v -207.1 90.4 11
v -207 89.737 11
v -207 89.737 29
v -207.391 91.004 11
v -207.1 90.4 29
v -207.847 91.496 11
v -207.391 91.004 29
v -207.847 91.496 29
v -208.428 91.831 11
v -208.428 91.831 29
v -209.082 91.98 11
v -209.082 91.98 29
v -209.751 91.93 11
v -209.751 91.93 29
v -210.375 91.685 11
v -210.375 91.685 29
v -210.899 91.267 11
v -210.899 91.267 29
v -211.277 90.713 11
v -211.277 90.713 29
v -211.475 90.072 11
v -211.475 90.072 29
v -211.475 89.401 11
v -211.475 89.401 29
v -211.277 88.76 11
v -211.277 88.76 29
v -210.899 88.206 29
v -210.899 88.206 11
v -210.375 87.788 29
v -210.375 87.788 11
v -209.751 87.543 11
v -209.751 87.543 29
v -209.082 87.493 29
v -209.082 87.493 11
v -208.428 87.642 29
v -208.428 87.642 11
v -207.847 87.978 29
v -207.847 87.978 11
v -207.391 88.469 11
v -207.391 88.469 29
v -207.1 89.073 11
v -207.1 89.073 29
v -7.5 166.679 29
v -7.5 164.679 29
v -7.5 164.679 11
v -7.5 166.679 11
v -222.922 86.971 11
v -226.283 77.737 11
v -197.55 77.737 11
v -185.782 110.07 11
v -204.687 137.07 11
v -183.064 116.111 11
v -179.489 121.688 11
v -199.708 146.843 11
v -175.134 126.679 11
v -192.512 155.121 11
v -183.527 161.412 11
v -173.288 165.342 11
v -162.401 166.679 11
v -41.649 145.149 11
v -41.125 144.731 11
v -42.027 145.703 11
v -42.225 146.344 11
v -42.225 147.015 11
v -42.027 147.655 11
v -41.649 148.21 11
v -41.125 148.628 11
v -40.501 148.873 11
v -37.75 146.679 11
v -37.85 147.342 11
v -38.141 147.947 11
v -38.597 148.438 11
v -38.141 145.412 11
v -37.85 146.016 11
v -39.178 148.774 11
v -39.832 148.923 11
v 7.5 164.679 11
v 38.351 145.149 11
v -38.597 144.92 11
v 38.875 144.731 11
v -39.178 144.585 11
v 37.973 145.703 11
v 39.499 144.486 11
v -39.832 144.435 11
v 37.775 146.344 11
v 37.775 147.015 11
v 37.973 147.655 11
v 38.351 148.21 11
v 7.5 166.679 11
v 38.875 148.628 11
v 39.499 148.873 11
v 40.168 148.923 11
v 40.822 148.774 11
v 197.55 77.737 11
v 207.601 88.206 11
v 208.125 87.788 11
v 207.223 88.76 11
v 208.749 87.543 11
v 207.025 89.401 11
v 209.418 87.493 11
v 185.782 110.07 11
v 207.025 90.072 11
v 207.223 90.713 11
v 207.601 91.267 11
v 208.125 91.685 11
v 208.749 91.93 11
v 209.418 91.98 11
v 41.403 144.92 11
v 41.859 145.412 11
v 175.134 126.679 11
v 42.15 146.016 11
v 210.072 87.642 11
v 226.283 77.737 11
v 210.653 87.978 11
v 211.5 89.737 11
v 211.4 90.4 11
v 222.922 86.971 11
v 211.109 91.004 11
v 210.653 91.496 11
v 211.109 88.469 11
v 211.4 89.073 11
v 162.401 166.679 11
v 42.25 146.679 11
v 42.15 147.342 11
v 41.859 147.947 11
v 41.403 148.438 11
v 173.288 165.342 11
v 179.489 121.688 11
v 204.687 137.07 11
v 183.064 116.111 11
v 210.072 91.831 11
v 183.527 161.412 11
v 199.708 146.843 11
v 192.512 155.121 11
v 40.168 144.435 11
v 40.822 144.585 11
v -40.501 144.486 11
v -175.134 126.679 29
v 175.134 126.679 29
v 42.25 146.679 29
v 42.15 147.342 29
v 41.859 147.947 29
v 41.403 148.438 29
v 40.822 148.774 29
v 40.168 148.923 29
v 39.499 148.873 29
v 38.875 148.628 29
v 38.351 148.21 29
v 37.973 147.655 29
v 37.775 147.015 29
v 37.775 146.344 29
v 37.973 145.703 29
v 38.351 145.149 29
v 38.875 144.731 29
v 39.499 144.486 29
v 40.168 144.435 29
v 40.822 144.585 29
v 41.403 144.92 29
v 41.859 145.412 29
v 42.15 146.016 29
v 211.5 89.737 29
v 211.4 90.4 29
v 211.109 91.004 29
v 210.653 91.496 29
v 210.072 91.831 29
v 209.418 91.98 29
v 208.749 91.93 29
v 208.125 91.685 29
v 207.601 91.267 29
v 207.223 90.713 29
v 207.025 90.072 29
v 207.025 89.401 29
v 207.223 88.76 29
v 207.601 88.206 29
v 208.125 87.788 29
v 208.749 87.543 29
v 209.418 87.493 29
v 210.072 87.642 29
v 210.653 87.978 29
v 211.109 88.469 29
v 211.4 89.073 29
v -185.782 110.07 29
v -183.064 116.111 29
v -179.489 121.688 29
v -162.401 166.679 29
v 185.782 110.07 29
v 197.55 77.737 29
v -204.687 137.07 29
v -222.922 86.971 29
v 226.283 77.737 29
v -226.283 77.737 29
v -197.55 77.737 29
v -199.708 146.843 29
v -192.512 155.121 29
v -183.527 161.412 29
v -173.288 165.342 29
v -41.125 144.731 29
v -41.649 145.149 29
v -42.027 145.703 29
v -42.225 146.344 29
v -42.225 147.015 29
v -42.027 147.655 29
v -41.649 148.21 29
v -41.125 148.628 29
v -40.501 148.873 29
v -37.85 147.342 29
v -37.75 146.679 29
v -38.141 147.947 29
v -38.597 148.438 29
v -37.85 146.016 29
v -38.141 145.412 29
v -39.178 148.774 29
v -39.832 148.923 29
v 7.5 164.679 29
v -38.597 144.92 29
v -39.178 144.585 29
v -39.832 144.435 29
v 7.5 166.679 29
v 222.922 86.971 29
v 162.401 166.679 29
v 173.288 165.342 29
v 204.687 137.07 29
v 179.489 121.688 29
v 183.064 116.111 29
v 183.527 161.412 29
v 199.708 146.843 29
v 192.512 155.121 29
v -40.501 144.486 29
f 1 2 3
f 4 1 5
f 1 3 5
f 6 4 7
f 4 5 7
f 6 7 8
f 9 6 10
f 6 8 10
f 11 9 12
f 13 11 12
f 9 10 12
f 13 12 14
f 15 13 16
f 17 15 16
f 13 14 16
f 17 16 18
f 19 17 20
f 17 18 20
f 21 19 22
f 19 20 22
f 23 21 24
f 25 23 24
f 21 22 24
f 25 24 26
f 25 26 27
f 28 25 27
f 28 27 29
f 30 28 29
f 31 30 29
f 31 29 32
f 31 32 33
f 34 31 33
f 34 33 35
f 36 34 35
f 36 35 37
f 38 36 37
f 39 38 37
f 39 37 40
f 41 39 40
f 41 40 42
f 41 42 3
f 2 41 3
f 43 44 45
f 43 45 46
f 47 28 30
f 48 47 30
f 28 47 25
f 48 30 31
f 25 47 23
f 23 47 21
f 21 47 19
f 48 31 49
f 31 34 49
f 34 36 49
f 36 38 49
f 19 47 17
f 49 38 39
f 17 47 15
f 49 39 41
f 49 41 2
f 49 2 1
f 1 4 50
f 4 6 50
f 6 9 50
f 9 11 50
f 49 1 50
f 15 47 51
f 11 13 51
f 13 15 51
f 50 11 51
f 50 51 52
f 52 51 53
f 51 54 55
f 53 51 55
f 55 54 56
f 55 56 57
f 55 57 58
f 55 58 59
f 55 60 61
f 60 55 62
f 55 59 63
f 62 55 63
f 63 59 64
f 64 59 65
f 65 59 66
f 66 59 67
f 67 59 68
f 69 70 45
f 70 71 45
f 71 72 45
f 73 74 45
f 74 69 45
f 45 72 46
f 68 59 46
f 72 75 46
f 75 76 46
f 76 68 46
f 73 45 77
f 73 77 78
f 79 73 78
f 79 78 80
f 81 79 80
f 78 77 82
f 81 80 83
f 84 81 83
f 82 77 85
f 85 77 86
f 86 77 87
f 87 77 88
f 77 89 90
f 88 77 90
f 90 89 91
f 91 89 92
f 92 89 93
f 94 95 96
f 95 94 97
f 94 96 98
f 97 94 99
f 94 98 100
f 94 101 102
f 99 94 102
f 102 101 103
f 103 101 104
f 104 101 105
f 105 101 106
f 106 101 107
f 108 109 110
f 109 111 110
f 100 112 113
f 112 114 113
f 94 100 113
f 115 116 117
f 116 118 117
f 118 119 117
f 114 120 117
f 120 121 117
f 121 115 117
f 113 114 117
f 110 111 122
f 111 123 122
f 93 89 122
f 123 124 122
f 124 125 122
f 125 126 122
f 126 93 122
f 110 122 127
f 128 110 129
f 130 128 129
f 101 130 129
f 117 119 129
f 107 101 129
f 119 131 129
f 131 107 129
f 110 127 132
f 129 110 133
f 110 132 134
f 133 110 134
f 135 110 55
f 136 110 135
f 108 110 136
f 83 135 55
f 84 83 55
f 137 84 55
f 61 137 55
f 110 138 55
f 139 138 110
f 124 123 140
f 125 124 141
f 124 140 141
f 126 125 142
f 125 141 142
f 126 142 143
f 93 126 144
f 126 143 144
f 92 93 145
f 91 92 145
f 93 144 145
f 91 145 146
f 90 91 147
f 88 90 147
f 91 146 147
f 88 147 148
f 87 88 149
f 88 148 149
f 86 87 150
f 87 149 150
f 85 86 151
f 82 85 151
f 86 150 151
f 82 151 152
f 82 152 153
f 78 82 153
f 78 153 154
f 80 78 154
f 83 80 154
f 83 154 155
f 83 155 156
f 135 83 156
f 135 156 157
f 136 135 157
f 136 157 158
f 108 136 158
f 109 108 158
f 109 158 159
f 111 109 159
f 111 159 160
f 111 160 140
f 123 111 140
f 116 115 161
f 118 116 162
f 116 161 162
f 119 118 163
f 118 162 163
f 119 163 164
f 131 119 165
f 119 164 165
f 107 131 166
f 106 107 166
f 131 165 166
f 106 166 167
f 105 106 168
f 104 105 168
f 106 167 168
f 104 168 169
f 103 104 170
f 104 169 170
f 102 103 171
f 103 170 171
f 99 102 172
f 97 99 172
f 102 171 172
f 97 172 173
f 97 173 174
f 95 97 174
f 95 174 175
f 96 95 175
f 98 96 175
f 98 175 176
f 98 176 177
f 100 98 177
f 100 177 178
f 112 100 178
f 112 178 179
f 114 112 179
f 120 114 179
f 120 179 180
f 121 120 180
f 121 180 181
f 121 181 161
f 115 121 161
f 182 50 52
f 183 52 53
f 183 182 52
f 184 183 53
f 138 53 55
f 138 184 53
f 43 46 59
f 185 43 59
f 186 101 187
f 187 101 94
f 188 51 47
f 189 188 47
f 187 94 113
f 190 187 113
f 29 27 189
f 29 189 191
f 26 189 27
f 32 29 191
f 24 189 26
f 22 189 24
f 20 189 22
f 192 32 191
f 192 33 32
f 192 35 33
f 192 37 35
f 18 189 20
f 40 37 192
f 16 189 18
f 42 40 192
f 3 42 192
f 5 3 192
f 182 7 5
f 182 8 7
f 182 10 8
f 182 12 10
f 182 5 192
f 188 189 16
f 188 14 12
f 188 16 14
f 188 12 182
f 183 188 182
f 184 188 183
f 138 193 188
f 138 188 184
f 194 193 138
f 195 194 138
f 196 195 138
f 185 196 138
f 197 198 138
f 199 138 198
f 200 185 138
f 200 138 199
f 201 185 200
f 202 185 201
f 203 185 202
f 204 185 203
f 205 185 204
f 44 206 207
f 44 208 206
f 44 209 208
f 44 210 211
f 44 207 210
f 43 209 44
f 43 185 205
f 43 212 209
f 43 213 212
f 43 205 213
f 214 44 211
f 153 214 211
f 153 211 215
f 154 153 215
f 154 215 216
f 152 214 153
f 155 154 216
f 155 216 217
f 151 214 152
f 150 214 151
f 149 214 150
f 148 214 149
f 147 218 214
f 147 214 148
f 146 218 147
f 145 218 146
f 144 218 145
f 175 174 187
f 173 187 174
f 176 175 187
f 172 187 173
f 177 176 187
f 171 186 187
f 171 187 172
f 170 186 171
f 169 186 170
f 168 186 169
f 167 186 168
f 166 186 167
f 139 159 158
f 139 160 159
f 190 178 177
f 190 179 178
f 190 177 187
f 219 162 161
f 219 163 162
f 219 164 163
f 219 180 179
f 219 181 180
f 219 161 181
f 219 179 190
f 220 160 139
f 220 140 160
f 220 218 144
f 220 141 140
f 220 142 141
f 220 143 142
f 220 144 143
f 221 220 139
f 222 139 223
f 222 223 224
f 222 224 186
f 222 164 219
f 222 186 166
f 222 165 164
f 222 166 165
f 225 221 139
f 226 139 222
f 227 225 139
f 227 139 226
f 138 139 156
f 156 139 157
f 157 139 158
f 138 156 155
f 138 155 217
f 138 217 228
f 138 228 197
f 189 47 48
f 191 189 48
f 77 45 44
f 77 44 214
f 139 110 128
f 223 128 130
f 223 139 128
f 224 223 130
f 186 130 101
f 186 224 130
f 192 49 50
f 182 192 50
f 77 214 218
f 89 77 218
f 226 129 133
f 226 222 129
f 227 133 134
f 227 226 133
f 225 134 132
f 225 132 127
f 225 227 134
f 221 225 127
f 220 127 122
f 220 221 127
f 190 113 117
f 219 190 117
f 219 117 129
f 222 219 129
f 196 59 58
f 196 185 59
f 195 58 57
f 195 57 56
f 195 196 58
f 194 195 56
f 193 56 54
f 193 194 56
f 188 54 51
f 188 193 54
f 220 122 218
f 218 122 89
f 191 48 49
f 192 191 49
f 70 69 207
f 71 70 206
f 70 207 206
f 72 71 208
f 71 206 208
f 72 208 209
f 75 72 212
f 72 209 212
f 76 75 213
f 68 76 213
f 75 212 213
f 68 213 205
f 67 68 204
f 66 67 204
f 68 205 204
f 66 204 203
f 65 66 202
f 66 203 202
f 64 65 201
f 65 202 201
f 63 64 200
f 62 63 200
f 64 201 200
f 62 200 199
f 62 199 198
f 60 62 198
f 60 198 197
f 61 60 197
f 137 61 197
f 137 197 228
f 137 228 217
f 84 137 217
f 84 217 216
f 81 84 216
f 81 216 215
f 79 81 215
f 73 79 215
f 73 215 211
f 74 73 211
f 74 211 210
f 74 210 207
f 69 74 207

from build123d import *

# Parameters (mm, degrees)
SALIENTE_EXTRUIR1_DEPTH = 40
REDONDEO1_R             = 100
ESCALA1_SCALE           = 0.6
ESCALA2_SCALE           = 0.75
SALIENTE_EXTRUIR2_DEPTH = 18
CROQUIS3_W              = 15
CROQUIS3_H              = 2
CORTAR_EXTRUIR1_DEPTH   = 19
CROQUIS4_R              = 2.25
CORTAR_EXTRUIR3_DEPTH   = 19
CROQUIS5_R              = 2.25
CORTAR_EXTRUIR4_DEPTH   = 19


with BuildPart() as part:
    # Croquis1 → Saliente-Extruir1 (new body)
    with BuildSketch(Plane.XY):
        Polygon((-439, 0), (-388.899497253, 137.65), (388.899497253, 137.65), (439, 0), (502.850666349, 0), (495.381557247, 20.5212086), (430.911949546, 197.65), (-430.911949546, 197.65), (-495.381557247, 20.5212086), (-502.850666349, 0), align=None)
    extrude(amount=SALIENTE_EXTRUIR1_DEPTH)

    # Redondeo1
    redondeo1_edges = [part.edges().sort_by_distance(p)[0] for p in [
        (-430.911949546, 197.65, 20),
        (430.911949546, 197.65, 20),
        (388.899497253, 137.65, 20),
        (-388.899497253, 137.65, 20),
    ]]
    fillet(redondeo1_edges, radius=REDONDEO1_R)


with BuildPart() as part_1:
    # Escala1: scaled about (0, 141.339436806, 20)
    add(part.part.scale(ESCALA1_SCALE).moved(Location((0, 56.535774722, 8))))


with BuildPart() as part_2:
    # Escala2: scaled about (0, 141.339436806, 20)
    add(part_1.part.scale(ESCALA2_SCALE).moved(Location((0, 35.334859202, 5))))

    # Croquis2 → Saliente-Extruir2 (add, through all)
    with BuildSketch(Plane.XY.offset(29)):
        with BuildLine():
            Line((-111.856850505, 126.679190243), (111.856850505, 126.679190243))
            Line((111.856850505, 126.679190243), (175.134018584, 126.679190243))
            ThreePointArc((175.134018584, 126.679190243), (160.598065921, 136.30250102), (143.495434545, 139.679190243))
            Line((143.495434545, 139.679190243), (-143.495434545, 139.679190243))
            ThreePointArc((-143.495434545, 139.679190243), (-160.598065921, 136.30250102), (-175.134018584, 126.679190243))
            Line((-175.134018584, 126.679190243), (-111.856850505, 126.679190243))
        make_face()
    extrude(amount=-SALIENTE_EXTRUIR2_DEPTH)

    # Croquis3 → Cortar-Extruir1 (cut, through all)
    with BuildSketch(Plane.XY.offset(29)):
        with Locations((0, 165.679190243)):
            Rectangle(CROQUIS3_W, CROQUIS3_H)
    extrude(amount=-CORTAR_EXTRUIR1_DEPTH, mode=Mode.SUBTRACT)

    # Croquis4 → Cortar-Extruir3 (cut, through all)
    with BuildSketch(Plane.XY.offset(29)):
        with Locations((209.25, 89.736690243)):
            Circle(CROQUIS4_R)
        with Locations((-209.25, 89.736690243)):
            Circle(CROQUIS4_R)
    extrude(amount=-CORTAR_EXTRUIR3_DEPTH, mode=Mode.SUBTRACT)

    # Croquis5 → Cortar-Extruir4 (cut, through all)
    with BuildSketch(Plane.XY.offset(29)):
        with Locations((-40, 146.679190243)):
            Circle(CROQUIS5_R)
        with Locations((40, 146.679190243)):
            Circle(CROQUIS5_R)
    extrude(amount=-CORTAR_EXTRUIR4_DEPTH, mode=Mode.SUBTRACT)


solid = part_2.part
